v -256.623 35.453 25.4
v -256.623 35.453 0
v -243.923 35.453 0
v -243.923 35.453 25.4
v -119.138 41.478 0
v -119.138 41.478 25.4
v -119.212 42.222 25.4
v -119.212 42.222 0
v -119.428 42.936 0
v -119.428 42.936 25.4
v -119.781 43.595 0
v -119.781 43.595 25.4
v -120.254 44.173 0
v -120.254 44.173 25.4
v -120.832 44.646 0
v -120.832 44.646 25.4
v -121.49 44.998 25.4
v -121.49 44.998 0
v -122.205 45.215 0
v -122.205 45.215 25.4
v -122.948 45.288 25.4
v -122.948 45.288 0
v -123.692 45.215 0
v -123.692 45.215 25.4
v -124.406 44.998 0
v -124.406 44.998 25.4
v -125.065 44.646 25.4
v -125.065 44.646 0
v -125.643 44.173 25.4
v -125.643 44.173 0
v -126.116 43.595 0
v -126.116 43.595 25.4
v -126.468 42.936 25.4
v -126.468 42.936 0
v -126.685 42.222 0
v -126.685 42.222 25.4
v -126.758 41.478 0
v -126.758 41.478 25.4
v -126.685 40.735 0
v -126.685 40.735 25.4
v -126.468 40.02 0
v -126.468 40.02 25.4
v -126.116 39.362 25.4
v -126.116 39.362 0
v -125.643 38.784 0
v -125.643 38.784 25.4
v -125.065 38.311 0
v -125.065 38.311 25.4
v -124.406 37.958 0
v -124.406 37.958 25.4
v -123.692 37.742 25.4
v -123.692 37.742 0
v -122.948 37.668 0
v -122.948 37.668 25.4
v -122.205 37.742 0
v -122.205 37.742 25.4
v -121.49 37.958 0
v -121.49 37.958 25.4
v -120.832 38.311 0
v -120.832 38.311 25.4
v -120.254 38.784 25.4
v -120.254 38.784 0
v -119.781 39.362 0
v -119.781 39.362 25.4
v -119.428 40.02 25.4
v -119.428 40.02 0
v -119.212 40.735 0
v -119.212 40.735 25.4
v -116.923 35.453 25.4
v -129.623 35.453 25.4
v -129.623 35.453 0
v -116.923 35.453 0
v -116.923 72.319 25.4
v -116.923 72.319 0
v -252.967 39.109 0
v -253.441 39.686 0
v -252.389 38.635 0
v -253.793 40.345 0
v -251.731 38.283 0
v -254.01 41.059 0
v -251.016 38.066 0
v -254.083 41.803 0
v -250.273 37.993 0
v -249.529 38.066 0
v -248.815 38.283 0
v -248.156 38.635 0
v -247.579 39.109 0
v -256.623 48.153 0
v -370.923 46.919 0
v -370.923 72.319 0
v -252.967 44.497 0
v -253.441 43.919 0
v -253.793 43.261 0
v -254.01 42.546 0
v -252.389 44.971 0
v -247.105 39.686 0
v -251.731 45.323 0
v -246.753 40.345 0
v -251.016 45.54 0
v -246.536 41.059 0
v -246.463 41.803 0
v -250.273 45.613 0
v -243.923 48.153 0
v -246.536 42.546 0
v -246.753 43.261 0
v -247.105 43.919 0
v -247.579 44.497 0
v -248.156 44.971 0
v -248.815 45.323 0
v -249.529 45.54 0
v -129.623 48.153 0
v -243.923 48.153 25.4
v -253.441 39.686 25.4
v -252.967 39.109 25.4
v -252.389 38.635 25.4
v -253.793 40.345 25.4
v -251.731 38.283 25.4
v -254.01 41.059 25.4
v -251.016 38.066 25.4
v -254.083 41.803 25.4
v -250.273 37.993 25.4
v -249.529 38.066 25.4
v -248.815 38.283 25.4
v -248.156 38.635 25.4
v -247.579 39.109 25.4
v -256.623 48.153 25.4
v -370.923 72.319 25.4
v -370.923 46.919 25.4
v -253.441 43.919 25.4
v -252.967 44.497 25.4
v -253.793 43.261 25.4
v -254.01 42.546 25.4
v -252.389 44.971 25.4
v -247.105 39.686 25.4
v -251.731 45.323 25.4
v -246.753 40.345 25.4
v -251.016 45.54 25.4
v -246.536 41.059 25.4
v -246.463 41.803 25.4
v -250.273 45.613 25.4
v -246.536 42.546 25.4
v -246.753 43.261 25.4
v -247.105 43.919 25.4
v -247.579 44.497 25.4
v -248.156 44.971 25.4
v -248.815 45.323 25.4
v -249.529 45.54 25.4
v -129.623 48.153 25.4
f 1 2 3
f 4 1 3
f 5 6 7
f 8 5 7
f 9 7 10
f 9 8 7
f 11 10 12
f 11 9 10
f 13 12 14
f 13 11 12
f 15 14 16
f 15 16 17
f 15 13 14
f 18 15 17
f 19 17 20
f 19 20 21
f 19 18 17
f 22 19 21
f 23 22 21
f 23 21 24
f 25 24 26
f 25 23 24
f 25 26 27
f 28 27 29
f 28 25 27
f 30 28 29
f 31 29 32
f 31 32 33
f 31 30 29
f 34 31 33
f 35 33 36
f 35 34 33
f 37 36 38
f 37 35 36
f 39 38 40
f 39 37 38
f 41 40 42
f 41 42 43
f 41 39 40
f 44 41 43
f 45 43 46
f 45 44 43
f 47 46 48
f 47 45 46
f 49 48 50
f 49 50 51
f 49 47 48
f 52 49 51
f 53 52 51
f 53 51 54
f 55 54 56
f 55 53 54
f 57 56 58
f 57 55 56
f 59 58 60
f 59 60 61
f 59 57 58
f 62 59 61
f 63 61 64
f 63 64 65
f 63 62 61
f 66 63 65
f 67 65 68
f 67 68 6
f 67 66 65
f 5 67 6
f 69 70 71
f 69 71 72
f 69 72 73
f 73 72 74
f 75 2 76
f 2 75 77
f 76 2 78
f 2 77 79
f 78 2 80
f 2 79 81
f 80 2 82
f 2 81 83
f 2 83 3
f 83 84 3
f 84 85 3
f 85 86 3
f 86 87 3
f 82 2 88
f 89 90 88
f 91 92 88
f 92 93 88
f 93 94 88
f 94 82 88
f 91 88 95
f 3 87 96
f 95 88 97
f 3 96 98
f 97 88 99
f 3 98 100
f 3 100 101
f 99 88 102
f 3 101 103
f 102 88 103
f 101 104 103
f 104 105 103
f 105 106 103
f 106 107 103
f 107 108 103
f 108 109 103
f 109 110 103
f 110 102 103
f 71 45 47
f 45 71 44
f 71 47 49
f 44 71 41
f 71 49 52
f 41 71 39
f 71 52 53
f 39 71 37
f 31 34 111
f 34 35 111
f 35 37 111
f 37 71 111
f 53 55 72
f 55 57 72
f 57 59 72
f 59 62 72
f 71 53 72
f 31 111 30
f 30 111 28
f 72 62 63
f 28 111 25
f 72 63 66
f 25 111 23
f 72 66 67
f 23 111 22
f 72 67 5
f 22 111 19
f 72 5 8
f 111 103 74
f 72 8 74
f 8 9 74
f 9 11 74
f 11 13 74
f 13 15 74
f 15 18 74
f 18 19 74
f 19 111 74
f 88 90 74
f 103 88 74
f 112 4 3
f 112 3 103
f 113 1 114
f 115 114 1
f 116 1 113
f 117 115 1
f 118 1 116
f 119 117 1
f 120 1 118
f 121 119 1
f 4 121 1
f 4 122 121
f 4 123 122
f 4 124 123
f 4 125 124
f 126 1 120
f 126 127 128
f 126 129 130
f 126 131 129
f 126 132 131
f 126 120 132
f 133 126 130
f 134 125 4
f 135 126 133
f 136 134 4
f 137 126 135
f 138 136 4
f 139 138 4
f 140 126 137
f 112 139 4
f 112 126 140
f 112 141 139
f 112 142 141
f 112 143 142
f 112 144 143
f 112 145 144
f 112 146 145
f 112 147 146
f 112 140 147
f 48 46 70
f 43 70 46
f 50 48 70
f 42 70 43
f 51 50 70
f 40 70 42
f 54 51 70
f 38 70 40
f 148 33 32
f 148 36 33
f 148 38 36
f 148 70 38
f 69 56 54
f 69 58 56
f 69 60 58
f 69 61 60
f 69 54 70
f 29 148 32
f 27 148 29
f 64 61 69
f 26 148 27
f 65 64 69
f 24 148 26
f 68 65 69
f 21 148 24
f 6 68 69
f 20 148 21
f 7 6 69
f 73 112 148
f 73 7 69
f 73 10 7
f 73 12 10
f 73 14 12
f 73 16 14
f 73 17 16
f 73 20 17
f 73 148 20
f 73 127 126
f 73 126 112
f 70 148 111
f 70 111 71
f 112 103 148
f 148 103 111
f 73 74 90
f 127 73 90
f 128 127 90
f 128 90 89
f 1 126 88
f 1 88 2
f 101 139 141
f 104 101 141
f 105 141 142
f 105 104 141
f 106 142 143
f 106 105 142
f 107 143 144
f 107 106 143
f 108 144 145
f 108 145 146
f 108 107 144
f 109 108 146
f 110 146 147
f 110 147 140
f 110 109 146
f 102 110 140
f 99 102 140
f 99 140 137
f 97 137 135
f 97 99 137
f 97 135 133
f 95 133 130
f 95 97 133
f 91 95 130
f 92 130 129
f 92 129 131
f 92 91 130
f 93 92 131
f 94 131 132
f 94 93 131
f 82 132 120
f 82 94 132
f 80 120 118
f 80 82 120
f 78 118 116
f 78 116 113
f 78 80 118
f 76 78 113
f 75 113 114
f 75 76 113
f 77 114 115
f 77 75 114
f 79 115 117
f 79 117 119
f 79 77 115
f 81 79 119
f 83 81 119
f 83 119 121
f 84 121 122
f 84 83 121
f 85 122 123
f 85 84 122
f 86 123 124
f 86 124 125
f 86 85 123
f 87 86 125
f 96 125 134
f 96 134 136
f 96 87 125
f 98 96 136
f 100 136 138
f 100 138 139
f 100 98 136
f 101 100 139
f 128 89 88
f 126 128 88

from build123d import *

# Parameters (mm, degrees)
F0_R     = 3.81
F1_DEPTH = 25.4


with BuildPart() as f1:
    # F0 (on Top) → F1 (new body)
    with BuildSketch(Plane.XY):
        Polygon((-116.922736, 72.318586), (-370.922736, 72.318586), (-370.922736, 46.918586), (-256.622736, 48.152742), (-256.622736, 35.452742), (-243.922736, 35.452742), (-243.922736, 48.152742), (-129.622736, 48.152742), (-129.622736, 35.452742), (-116.922736, 35.452742), (-116.922736, 46.918586), align=None)
        with Locations((-250.272736, 41.802742)):
            Circle(F0_R, mode=Mode.SUBTRACT)
        with Locations((-122.94844, 41.478446)):
            Circle(F0_R, mode=Mode.SUBTRACT)
    extrude(amount=F1_DEPTH)


solid = f1.part
